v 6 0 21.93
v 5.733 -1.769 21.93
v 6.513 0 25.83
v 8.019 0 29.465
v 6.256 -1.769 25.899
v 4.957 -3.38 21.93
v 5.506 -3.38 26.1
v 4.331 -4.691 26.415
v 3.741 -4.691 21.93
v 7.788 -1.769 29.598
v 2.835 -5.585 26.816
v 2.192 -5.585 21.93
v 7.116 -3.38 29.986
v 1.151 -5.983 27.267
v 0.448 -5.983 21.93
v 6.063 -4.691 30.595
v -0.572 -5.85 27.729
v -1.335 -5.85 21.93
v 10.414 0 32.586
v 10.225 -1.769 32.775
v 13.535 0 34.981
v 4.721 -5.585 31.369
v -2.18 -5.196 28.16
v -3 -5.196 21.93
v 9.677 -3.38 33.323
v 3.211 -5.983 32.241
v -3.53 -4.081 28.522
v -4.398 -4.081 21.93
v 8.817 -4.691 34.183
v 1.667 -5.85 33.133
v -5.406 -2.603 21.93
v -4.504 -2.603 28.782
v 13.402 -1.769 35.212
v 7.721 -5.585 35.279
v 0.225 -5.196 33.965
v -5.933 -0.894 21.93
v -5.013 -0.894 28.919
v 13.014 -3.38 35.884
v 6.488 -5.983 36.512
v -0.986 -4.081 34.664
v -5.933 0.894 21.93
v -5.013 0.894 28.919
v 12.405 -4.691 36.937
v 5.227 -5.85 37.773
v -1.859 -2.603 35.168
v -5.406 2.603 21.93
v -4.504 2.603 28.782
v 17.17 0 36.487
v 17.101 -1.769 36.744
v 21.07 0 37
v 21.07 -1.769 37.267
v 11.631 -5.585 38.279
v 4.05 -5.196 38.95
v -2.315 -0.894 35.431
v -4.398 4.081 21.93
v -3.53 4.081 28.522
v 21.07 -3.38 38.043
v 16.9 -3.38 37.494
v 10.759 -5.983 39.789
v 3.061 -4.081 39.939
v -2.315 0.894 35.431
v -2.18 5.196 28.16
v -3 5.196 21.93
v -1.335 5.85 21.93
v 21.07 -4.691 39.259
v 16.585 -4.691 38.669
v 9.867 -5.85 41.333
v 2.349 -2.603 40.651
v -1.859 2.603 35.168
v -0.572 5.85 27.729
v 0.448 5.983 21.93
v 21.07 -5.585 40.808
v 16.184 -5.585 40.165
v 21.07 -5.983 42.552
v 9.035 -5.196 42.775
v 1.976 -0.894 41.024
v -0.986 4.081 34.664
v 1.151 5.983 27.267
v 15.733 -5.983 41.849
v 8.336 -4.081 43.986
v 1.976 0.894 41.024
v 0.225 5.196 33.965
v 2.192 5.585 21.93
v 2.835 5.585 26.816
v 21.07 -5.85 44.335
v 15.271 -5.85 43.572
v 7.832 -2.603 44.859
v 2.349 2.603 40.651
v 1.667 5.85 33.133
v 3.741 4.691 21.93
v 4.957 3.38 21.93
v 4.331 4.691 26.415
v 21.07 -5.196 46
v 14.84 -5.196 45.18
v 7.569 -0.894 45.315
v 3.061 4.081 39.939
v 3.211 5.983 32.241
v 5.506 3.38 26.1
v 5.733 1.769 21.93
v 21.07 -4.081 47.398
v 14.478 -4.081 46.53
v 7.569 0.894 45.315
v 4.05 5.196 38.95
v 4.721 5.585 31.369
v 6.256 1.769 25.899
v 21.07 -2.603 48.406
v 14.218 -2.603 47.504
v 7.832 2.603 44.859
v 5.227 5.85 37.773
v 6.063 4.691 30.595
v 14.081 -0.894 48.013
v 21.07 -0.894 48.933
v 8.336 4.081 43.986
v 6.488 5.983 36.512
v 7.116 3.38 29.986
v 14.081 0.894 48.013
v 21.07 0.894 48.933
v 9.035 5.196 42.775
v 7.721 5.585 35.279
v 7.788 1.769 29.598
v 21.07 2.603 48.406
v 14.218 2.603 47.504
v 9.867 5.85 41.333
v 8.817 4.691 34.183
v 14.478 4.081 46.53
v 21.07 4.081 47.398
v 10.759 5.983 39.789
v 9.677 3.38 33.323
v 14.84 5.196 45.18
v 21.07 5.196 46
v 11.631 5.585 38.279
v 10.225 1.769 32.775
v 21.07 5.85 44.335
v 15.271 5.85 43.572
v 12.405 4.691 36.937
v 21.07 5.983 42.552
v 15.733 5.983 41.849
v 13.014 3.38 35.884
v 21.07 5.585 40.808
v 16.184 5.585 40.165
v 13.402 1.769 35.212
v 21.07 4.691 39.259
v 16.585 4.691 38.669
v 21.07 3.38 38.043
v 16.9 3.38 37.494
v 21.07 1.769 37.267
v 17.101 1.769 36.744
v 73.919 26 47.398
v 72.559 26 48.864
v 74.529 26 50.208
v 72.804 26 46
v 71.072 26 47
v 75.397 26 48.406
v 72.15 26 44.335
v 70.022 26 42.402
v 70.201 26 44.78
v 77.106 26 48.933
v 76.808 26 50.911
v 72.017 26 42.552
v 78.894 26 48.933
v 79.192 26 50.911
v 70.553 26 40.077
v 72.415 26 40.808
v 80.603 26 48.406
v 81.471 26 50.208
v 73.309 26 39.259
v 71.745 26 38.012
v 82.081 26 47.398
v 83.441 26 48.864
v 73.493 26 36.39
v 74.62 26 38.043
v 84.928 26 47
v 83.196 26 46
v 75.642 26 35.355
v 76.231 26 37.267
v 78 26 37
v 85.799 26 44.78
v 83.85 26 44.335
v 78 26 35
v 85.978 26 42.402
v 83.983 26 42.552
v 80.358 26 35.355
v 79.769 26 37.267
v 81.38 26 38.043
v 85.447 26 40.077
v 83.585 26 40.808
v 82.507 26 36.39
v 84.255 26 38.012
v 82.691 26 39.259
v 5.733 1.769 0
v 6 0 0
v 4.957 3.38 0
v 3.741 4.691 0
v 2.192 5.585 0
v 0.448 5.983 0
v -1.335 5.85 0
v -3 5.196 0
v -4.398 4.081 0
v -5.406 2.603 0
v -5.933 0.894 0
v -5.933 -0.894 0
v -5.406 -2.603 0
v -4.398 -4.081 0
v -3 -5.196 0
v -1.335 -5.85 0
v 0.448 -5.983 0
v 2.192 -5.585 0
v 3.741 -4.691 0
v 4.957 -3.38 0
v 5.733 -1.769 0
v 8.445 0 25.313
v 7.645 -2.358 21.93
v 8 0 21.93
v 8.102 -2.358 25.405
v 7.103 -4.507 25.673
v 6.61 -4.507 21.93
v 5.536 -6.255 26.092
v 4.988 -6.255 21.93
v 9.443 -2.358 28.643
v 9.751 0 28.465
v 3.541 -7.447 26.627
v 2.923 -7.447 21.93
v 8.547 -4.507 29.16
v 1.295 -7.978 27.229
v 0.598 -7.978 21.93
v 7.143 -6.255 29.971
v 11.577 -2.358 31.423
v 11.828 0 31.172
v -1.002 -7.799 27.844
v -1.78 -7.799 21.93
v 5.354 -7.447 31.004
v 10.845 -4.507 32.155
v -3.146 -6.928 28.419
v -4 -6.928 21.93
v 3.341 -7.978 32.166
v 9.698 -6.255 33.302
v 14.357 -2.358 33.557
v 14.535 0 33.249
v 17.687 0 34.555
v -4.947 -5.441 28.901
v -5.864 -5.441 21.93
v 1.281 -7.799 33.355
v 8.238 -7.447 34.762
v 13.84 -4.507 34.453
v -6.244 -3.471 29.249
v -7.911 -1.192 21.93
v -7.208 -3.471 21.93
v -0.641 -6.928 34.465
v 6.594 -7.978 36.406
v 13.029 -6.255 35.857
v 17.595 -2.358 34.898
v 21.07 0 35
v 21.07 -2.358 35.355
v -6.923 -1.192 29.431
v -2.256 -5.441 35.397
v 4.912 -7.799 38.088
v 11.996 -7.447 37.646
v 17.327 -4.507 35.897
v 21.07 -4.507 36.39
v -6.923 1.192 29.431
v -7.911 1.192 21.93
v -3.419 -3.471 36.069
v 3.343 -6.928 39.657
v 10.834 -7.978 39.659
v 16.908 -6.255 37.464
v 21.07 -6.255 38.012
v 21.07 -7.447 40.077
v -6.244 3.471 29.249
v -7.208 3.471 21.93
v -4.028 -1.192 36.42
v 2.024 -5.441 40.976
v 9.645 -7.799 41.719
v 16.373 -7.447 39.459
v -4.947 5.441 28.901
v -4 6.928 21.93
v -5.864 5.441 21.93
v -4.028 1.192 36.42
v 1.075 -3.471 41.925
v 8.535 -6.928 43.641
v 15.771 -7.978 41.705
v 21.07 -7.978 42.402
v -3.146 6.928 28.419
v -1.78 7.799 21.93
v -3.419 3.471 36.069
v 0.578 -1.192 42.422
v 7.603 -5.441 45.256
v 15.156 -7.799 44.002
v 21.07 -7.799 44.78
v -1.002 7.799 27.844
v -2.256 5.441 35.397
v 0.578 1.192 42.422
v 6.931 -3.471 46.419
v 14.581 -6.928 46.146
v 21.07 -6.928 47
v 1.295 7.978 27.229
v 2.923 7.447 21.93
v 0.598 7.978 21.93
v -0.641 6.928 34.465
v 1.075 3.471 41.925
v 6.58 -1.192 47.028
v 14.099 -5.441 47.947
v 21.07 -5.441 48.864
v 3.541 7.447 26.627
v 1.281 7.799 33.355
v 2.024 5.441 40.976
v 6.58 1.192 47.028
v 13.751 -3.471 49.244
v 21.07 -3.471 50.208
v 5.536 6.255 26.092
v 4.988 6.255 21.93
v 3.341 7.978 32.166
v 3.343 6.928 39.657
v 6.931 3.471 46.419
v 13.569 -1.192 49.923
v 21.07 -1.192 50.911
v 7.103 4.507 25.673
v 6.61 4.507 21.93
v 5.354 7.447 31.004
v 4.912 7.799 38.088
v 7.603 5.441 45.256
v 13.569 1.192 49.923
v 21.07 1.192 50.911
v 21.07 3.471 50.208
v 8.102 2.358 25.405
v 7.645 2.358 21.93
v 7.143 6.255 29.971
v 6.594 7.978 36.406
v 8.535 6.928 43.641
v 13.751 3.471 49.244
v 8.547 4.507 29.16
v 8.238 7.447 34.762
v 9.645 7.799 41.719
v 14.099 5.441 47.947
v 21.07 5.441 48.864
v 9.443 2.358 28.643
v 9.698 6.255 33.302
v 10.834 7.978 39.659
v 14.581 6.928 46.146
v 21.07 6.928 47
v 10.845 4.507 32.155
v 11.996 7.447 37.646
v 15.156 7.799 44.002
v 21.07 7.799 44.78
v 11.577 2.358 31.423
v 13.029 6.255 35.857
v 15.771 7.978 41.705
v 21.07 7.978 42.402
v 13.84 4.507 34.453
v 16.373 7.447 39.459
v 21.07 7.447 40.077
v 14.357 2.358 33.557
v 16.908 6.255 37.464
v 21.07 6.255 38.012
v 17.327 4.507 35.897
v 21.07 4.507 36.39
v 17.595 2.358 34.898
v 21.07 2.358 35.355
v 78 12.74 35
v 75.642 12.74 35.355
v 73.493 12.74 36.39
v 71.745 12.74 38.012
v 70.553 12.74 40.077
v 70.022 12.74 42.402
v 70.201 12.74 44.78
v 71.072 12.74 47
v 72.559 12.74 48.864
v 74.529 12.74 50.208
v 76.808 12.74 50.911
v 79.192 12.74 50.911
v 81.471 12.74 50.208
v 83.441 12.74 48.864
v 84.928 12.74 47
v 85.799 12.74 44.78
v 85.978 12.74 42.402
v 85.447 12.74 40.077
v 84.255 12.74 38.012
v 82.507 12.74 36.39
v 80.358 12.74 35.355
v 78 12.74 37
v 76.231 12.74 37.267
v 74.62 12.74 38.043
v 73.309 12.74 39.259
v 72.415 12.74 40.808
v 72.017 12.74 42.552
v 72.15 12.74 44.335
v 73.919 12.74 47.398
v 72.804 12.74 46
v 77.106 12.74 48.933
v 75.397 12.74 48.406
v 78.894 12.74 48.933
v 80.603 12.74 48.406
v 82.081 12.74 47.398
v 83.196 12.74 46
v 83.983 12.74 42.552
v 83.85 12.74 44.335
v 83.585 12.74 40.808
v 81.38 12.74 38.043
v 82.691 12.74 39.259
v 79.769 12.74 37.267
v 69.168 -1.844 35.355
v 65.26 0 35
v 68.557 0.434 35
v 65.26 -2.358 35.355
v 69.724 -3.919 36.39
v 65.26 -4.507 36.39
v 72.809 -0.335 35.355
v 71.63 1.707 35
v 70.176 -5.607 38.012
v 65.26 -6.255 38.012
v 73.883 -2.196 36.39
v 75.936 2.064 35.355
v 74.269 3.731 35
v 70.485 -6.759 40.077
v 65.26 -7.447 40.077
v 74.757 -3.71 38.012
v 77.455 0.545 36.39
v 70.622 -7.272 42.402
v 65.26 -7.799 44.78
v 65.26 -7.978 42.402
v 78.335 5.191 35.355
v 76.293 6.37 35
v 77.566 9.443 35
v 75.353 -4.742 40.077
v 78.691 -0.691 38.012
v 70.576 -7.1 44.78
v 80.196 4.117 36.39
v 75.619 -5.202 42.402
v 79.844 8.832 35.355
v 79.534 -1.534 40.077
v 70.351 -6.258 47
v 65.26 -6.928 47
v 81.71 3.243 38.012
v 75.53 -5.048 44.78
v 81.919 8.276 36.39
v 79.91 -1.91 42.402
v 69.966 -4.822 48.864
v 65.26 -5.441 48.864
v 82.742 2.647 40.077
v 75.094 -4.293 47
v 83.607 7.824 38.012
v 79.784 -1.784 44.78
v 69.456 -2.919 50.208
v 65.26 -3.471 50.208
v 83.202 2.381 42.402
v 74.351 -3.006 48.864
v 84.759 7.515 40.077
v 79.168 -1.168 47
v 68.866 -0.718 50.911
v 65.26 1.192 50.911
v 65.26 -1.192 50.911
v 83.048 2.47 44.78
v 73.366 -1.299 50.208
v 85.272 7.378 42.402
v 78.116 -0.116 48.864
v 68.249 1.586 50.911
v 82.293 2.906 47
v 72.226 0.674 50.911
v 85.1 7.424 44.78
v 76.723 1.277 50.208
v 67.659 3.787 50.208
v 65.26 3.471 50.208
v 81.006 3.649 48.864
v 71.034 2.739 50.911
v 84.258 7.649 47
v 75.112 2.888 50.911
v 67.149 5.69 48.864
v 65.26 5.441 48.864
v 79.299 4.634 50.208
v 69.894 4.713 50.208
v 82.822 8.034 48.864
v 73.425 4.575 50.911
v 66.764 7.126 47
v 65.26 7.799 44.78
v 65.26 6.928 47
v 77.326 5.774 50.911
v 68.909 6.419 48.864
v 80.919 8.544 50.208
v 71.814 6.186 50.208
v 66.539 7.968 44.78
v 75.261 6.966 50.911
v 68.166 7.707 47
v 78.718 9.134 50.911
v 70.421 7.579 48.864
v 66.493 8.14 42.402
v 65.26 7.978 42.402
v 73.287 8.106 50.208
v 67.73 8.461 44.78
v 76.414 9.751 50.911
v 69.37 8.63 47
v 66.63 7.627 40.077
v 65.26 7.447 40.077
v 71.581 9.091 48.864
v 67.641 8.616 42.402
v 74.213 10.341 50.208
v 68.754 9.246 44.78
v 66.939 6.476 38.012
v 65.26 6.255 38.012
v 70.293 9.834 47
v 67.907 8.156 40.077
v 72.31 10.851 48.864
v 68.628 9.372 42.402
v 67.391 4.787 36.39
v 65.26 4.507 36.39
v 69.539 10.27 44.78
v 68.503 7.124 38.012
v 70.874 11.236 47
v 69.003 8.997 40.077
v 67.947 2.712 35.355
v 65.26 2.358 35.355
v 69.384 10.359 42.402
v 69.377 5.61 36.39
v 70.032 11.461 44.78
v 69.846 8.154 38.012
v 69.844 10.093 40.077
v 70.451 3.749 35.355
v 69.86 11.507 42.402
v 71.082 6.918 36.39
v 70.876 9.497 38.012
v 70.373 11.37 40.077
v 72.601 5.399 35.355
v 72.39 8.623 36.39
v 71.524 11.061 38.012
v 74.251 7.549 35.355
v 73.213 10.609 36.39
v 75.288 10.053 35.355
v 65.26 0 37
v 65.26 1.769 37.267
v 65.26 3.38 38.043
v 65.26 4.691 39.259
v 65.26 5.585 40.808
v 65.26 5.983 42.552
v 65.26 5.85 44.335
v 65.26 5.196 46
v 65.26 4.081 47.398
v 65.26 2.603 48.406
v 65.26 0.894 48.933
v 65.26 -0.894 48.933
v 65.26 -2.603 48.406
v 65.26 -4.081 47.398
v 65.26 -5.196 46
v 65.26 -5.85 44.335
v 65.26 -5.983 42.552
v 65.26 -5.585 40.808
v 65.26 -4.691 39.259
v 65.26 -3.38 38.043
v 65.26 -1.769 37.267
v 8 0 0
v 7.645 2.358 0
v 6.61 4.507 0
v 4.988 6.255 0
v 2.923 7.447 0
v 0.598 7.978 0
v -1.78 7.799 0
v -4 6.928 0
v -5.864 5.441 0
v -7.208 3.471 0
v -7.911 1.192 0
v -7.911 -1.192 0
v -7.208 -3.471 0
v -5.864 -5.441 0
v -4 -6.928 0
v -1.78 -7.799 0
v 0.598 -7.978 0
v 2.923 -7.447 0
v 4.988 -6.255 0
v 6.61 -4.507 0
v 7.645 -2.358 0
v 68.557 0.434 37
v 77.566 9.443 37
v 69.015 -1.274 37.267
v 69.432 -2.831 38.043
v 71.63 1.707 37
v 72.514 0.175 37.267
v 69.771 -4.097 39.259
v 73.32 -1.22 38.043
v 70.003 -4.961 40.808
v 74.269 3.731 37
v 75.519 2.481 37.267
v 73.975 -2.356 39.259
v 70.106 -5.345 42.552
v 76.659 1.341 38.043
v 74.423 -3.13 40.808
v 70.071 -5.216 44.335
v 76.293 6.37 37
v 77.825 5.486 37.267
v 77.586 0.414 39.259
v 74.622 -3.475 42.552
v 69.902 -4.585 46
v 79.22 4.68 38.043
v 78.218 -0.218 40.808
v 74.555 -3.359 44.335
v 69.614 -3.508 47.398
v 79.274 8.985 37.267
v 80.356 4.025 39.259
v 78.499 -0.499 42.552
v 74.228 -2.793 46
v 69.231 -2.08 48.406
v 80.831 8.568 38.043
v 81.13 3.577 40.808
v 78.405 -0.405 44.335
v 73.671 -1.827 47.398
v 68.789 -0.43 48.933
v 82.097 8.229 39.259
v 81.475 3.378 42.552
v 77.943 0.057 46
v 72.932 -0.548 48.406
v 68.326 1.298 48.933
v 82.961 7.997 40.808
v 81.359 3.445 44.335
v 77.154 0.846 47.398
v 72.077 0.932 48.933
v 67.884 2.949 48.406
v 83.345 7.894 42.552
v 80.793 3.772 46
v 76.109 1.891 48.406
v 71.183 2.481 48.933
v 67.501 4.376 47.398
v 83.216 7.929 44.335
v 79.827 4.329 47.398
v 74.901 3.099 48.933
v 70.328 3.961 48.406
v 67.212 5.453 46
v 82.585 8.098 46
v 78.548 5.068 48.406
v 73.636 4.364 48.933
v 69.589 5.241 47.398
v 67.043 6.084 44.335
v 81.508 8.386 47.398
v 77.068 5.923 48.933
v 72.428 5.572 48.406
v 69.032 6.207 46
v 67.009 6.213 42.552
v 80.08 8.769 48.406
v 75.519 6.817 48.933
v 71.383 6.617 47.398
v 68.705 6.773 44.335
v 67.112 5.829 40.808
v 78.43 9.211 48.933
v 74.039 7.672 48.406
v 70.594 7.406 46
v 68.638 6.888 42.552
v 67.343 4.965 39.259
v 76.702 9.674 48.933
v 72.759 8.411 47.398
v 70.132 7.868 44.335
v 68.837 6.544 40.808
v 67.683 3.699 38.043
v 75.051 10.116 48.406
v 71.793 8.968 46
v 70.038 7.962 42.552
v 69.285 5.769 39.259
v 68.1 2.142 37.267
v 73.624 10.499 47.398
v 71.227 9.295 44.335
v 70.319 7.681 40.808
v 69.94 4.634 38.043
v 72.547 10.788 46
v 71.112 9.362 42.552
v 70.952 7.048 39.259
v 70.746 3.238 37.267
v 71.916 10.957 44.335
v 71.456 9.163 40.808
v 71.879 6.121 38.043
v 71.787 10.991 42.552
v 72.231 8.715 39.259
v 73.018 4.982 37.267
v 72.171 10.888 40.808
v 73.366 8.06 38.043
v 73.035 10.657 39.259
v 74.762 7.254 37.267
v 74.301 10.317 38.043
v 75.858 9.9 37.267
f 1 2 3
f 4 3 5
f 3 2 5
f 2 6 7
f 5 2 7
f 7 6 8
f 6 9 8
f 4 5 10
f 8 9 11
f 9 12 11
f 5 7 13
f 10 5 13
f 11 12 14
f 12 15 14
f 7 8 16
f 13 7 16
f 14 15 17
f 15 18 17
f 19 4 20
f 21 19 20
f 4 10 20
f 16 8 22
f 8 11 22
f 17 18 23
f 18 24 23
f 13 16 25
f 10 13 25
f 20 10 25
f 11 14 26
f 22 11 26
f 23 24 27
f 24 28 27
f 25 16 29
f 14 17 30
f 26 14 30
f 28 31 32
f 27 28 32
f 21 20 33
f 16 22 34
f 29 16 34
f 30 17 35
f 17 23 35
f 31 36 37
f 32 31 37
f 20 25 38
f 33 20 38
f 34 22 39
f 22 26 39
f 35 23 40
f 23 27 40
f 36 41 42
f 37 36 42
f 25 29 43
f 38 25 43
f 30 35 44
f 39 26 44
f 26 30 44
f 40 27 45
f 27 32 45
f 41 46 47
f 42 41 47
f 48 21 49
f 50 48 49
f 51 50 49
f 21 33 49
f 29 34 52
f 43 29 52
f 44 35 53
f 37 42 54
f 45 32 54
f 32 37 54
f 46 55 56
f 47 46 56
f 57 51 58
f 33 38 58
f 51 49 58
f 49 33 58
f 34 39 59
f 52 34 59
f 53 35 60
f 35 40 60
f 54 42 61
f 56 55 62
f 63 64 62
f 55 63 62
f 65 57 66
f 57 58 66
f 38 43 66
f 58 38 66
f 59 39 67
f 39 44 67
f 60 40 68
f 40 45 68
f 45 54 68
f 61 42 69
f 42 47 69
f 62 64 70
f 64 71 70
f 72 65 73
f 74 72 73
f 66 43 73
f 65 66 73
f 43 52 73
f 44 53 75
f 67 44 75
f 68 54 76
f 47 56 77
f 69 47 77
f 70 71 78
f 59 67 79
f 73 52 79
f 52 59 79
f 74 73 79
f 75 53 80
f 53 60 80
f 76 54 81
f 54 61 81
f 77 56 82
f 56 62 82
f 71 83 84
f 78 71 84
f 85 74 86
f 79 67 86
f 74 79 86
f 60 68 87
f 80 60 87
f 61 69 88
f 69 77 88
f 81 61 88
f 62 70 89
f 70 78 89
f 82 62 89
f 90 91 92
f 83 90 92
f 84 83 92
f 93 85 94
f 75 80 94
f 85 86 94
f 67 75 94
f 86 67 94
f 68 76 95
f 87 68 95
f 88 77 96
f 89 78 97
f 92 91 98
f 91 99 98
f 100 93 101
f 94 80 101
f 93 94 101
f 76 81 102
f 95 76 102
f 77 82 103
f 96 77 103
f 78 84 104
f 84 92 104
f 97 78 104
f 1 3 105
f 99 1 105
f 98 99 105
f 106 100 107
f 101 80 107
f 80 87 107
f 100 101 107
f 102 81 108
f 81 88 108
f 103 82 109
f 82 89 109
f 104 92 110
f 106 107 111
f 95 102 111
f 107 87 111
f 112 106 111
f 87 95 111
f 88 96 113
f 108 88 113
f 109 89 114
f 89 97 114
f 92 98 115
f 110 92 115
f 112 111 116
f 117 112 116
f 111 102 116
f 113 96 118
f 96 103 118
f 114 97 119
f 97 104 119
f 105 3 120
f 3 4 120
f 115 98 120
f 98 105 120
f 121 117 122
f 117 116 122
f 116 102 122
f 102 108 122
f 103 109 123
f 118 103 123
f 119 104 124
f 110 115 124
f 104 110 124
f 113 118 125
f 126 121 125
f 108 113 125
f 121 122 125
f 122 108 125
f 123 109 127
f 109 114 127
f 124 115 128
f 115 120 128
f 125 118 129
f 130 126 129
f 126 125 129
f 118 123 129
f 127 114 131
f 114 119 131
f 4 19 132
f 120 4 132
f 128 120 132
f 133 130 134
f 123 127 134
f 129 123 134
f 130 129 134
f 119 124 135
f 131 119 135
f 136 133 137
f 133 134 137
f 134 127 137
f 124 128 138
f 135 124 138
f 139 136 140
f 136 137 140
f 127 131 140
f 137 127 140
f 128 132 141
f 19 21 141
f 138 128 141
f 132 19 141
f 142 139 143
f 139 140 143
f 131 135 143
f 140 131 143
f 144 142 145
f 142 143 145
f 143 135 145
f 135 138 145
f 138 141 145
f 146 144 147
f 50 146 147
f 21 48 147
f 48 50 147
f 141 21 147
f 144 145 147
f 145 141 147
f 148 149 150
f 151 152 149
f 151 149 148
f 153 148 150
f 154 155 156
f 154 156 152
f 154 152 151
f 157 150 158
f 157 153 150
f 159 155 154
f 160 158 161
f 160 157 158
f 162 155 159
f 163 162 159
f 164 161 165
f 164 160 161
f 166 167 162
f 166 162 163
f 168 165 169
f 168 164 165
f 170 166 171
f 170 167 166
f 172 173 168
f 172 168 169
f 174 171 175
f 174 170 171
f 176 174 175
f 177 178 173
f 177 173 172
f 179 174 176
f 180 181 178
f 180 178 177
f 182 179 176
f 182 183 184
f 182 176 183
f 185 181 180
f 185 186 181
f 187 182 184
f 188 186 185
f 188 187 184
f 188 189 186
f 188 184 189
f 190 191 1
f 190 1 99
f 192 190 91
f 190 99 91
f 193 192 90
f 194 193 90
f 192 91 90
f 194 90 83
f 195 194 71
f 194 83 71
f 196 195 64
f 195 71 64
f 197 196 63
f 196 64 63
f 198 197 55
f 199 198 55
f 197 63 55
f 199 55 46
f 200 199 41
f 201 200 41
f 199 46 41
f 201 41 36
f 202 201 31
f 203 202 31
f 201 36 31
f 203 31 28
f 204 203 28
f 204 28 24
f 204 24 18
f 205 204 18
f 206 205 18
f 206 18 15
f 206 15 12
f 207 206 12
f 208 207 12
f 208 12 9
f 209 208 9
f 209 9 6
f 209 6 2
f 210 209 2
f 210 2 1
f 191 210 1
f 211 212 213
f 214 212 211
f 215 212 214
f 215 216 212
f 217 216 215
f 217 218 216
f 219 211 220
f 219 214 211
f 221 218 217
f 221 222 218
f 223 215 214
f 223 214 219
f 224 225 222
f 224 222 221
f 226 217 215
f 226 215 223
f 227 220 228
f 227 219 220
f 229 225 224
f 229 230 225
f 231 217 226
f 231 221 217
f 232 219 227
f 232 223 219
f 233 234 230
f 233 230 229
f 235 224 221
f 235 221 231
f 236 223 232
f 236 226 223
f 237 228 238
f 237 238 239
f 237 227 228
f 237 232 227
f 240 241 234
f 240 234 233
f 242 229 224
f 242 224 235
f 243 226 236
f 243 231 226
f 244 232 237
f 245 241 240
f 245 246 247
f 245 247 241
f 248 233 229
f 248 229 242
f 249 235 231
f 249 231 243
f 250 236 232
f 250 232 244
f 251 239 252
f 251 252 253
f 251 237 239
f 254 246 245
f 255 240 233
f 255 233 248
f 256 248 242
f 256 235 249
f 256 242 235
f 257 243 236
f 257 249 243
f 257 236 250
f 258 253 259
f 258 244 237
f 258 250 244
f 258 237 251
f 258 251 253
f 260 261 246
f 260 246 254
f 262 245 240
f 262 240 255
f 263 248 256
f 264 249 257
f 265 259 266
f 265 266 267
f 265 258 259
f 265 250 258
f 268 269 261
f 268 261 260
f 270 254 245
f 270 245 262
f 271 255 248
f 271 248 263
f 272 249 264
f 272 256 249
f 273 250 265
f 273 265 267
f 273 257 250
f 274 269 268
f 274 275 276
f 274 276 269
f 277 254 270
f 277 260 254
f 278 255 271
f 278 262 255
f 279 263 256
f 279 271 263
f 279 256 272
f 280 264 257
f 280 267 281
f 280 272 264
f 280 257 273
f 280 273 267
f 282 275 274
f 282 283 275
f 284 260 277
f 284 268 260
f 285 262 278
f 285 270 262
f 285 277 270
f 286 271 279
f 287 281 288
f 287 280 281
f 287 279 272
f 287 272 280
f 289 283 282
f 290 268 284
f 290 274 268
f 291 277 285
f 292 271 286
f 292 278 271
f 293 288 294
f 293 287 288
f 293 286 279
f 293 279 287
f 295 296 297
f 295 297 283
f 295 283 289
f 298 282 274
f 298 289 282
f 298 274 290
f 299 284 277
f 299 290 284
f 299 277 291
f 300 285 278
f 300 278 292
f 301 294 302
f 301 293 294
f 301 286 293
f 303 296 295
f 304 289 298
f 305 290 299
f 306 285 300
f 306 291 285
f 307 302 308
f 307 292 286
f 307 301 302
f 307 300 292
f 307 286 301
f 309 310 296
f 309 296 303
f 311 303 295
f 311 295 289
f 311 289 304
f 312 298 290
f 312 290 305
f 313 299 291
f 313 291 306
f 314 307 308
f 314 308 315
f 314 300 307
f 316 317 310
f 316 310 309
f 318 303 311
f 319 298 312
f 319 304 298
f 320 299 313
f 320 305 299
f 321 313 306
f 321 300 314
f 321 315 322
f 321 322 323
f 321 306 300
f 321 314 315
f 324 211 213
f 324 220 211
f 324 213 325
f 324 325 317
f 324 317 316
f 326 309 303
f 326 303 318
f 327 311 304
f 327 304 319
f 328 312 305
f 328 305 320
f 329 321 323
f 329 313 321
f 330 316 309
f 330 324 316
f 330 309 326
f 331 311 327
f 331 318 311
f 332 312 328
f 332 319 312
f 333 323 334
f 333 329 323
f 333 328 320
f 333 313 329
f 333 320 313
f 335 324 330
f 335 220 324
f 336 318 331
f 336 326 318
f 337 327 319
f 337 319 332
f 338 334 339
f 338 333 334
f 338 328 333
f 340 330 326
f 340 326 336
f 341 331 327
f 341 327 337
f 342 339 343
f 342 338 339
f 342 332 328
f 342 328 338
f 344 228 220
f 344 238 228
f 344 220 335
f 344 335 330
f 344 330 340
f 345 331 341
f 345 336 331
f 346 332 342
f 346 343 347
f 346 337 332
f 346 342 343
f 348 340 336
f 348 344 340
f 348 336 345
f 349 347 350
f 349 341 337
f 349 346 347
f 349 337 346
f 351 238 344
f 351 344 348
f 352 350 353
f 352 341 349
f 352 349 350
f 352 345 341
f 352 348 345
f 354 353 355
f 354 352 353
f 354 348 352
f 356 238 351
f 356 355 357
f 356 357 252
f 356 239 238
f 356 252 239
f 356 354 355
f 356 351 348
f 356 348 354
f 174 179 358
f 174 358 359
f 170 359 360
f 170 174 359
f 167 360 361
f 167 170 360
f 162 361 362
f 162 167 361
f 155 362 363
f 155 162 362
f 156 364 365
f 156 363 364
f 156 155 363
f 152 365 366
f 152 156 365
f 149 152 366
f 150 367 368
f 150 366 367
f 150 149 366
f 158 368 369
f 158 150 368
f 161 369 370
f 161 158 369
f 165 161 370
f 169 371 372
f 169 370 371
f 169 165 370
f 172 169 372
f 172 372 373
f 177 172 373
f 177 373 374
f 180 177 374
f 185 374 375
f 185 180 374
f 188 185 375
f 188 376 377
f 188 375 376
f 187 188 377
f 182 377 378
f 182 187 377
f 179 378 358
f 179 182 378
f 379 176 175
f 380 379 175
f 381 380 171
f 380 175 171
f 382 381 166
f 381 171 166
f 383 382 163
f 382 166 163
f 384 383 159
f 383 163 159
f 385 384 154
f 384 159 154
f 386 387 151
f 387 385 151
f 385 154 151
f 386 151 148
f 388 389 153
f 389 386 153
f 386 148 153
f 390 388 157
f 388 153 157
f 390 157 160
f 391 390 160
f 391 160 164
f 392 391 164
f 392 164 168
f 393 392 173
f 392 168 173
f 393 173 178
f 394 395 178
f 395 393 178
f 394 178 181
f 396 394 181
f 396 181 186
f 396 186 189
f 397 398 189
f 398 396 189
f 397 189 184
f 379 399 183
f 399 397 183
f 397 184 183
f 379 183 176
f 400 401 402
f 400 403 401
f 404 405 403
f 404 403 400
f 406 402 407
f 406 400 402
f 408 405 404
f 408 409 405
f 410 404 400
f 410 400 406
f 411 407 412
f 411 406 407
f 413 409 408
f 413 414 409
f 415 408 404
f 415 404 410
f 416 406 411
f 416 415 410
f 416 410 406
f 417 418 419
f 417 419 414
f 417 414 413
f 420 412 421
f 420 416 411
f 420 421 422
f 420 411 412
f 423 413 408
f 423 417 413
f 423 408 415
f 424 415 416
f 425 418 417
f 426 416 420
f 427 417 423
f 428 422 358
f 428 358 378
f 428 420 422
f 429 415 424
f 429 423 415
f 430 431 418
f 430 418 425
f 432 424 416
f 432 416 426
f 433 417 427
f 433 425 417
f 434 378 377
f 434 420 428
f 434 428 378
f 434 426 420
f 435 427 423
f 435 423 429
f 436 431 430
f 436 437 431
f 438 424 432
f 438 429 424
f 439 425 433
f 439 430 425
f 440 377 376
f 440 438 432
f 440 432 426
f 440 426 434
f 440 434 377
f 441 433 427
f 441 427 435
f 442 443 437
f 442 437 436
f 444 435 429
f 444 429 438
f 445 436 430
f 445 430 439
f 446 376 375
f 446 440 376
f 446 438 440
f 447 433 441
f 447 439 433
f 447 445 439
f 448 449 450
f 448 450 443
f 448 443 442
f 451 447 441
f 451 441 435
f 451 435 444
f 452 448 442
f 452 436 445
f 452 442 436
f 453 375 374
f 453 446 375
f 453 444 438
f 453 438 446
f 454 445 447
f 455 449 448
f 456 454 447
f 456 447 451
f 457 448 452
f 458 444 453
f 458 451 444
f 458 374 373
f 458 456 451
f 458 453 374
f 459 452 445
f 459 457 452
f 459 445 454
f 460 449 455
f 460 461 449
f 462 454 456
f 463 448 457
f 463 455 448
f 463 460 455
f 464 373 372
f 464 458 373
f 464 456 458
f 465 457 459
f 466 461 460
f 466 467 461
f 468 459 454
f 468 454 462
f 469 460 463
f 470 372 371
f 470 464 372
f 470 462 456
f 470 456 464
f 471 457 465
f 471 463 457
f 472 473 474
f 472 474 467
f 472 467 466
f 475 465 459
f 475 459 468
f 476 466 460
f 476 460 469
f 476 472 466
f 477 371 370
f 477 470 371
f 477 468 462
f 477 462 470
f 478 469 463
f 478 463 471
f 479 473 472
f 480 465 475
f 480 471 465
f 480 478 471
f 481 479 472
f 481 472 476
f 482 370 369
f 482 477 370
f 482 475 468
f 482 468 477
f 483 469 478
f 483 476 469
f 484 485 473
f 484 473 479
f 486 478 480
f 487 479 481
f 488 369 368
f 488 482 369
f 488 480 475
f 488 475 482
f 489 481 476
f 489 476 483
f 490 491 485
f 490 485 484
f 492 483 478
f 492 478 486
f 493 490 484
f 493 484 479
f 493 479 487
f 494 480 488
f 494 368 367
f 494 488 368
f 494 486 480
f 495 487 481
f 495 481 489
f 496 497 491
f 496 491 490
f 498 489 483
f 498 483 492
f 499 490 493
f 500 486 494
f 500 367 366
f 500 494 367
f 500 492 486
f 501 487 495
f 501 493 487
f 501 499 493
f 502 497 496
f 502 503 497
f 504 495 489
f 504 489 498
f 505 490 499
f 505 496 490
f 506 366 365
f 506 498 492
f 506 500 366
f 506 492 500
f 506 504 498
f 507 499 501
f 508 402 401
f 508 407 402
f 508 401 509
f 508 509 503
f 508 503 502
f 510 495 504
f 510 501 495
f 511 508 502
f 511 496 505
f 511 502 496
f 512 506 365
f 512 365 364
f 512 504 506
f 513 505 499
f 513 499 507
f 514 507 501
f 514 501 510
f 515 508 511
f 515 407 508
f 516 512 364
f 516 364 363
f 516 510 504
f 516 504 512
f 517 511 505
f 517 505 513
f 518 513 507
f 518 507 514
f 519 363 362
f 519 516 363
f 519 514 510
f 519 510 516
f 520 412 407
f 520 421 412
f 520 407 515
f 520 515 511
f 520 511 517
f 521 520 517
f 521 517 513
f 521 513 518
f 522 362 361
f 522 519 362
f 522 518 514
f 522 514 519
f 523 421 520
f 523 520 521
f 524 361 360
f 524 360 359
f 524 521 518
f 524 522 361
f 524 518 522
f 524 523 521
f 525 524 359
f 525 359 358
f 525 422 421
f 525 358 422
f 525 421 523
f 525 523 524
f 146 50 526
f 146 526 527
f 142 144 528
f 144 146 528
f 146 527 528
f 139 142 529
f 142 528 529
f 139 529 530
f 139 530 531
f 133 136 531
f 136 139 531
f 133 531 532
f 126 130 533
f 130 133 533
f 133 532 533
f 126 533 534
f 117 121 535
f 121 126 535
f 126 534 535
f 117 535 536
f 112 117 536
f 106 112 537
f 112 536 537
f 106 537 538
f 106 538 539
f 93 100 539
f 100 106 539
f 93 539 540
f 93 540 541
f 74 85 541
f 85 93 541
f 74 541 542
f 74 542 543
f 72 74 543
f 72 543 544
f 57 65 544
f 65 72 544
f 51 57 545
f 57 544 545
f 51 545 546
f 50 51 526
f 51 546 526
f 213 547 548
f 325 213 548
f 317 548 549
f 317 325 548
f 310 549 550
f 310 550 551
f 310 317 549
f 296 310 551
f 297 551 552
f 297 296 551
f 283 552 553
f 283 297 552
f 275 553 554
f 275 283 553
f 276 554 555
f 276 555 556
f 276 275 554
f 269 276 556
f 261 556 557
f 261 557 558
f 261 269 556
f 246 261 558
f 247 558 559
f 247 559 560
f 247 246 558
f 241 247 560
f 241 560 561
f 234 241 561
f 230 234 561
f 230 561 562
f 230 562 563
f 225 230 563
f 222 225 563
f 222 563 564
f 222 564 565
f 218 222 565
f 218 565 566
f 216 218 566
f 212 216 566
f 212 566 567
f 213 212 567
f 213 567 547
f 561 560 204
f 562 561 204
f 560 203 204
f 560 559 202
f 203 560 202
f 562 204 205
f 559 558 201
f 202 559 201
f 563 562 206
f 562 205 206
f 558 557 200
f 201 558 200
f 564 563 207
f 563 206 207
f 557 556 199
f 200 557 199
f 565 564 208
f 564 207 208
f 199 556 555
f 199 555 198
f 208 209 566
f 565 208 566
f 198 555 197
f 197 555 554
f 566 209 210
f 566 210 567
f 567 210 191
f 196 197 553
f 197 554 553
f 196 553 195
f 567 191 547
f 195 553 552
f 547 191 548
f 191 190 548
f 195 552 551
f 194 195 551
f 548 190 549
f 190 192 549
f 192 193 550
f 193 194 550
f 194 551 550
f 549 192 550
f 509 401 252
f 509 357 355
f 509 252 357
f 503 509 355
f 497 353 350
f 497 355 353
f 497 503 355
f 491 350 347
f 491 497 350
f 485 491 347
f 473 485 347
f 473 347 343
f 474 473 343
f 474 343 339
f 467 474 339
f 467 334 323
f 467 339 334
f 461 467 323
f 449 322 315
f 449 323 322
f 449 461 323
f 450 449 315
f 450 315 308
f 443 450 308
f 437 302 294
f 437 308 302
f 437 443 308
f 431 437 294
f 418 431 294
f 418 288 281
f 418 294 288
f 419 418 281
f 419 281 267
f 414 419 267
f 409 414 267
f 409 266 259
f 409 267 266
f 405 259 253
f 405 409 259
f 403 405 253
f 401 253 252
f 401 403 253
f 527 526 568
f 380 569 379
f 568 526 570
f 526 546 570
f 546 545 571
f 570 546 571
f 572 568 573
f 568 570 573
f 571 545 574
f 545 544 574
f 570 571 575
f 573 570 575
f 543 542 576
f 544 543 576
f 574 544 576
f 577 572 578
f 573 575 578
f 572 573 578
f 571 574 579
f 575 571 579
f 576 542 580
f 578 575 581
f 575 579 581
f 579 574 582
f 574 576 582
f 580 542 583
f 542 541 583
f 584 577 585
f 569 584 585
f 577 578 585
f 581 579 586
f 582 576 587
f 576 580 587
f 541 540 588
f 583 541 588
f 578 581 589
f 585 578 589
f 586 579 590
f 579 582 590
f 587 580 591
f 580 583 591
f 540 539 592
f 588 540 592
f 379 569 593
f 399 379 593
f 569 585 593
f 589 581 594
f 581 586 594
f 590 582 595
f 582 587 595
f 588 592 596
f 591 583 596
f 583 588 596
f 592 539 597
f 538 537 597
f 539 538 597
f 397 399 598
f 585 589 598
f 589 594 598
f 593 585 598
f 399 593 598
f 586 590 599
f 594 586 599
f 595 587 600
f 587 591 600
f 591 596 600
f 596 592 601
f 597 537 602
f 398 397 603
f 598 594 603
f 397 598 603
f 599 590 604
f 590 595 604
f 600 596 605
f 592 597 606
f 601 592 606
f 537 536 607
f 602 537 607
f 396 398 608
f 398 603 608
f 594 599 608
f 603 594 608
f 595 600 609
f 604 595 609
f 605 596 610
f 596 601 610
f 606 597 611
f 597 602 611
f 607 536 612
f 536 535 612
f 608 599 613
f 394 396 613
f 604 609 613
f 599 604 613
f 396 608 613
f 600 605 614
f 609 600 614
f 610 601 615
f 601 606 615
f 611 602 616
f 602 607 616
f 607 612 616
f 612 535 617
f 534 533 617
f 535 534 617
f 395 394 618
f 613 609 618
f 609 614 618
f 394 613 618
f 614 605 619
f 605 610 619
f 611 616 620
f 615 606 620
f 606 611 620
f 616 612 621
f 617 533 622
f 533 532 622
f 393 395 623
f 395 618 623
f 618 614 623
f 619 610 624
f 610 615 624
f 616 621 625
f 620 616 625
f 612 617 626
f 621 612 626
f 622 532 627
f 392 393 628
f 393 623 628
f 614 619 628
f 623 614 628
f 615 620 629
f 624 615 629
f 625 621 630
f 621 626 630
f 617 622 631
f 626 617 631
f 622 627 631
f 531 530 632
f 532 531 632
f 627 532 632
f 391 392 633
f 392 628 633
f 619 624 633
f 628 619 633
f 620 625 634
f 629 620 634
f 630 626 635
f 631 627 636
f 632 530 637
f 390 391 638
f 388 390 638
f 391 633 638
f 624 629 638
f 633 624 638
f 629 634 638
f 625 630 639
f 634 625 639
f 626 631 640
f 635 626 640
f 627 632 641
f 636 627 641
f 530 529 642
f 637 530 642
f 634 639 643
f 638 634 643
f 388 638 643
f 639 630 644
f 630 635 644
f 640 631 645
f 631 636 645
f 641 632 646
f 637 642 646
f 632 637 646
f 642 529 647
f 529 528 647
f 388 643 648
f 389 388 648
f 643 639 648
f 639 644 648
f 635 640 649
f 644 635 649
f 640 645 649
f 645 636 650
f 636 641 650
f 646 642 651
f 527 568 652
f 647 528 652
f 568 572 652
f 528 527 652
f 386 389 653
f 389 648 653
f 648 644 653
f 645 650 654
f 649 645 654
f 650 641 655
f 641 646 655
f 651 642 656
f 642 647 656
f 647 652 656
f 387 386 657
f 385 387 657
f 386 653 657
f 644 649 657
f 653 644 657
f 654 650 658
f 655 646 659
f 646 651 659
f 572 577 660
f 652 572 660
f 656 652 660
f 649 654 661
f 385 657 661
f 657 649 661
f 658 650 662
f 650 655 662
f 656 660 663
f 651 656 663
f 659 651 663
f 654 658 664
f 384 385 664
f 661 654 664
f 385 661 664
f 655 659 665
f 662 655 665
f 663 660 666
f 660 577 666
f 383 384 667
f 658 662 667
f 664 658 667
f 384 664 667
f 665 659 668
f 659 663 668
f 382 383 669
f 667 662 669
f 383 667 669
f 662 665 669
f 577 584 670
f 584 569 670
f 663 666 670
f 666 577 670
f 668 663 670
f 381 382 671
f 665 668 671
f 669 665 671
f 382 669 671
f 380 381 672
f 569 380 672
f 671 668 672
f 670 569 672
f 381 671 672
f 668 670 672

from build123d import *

# Parameters (mm, degrees)
SWEEP1_PROFILE_R                           = 8
HOLLOW_TUBE_OD_AND_WALL_PROVISIONAL_PROF_R = 6


with BuildPart() as part:
    # Sweep1: sweep along a curve in space
    with BuildLine() as sweep1_path:
        Line((0, 0, 0), (0, 0, 21.930000411))
        ThreePointArc((0, 0, 21.930000411), (6.171260145, 0, 36.828740145), (21.07, 0, 43))
        Line((21.07, 0, 43), (65.259998661, 0, 43))
        ThreePointArc((65.259998661, 0, 43), (74.268539526, 3.731459526, 43), (78, 12.74, 43))
        Line((78, 12.74, 43), (78, 26, 43))
    # Sweep1 profile (on start of the path) → Sweep1 (sweep)
    with BuildSketch(Plane.XY):
        Circle(SWEEP1_PROFILE_R)
    sweep(path=sweep1_path.line)

    # Hollow_tube_OD_and_wall_PROVISIONAL: sweep along a curve in space
    with BuildLine() as hollow_tube_od_and_wall_provisional_path:
        Line((0, 0, 0), (0, 0, 21.930000411))
        ThreePointArc((0, 0, 21.930000411), (6.171260145, 0, 36.828740145), (21.07, 0, 43))
        Line((21.07, 0, 43), (65.259998661, 0, 43))
        ThreePointArc((65.259998661, 0, 43), (74.268539526, 3.731459526, 43), (78, 12.74, 43))
        Line((78, 12.74, 43), (78, 26, 43))
    # Hollow_tube_OD_and_wall_PROVISIONAL prof (on start of the path) → Hollow_tube_OD_and_wall_PROVISIONAL (sweep, cut)
    with BuildSketch(Plane.XY):
        Circle(HOLLOW_TUBE_OD_AND_WALL_PROVISIONAL_PROF_R)
    sweep(path=hollow_tube_od_and_wall_provisional_path.line, mode=Mode.SUBTRACT)


solid = part.part
